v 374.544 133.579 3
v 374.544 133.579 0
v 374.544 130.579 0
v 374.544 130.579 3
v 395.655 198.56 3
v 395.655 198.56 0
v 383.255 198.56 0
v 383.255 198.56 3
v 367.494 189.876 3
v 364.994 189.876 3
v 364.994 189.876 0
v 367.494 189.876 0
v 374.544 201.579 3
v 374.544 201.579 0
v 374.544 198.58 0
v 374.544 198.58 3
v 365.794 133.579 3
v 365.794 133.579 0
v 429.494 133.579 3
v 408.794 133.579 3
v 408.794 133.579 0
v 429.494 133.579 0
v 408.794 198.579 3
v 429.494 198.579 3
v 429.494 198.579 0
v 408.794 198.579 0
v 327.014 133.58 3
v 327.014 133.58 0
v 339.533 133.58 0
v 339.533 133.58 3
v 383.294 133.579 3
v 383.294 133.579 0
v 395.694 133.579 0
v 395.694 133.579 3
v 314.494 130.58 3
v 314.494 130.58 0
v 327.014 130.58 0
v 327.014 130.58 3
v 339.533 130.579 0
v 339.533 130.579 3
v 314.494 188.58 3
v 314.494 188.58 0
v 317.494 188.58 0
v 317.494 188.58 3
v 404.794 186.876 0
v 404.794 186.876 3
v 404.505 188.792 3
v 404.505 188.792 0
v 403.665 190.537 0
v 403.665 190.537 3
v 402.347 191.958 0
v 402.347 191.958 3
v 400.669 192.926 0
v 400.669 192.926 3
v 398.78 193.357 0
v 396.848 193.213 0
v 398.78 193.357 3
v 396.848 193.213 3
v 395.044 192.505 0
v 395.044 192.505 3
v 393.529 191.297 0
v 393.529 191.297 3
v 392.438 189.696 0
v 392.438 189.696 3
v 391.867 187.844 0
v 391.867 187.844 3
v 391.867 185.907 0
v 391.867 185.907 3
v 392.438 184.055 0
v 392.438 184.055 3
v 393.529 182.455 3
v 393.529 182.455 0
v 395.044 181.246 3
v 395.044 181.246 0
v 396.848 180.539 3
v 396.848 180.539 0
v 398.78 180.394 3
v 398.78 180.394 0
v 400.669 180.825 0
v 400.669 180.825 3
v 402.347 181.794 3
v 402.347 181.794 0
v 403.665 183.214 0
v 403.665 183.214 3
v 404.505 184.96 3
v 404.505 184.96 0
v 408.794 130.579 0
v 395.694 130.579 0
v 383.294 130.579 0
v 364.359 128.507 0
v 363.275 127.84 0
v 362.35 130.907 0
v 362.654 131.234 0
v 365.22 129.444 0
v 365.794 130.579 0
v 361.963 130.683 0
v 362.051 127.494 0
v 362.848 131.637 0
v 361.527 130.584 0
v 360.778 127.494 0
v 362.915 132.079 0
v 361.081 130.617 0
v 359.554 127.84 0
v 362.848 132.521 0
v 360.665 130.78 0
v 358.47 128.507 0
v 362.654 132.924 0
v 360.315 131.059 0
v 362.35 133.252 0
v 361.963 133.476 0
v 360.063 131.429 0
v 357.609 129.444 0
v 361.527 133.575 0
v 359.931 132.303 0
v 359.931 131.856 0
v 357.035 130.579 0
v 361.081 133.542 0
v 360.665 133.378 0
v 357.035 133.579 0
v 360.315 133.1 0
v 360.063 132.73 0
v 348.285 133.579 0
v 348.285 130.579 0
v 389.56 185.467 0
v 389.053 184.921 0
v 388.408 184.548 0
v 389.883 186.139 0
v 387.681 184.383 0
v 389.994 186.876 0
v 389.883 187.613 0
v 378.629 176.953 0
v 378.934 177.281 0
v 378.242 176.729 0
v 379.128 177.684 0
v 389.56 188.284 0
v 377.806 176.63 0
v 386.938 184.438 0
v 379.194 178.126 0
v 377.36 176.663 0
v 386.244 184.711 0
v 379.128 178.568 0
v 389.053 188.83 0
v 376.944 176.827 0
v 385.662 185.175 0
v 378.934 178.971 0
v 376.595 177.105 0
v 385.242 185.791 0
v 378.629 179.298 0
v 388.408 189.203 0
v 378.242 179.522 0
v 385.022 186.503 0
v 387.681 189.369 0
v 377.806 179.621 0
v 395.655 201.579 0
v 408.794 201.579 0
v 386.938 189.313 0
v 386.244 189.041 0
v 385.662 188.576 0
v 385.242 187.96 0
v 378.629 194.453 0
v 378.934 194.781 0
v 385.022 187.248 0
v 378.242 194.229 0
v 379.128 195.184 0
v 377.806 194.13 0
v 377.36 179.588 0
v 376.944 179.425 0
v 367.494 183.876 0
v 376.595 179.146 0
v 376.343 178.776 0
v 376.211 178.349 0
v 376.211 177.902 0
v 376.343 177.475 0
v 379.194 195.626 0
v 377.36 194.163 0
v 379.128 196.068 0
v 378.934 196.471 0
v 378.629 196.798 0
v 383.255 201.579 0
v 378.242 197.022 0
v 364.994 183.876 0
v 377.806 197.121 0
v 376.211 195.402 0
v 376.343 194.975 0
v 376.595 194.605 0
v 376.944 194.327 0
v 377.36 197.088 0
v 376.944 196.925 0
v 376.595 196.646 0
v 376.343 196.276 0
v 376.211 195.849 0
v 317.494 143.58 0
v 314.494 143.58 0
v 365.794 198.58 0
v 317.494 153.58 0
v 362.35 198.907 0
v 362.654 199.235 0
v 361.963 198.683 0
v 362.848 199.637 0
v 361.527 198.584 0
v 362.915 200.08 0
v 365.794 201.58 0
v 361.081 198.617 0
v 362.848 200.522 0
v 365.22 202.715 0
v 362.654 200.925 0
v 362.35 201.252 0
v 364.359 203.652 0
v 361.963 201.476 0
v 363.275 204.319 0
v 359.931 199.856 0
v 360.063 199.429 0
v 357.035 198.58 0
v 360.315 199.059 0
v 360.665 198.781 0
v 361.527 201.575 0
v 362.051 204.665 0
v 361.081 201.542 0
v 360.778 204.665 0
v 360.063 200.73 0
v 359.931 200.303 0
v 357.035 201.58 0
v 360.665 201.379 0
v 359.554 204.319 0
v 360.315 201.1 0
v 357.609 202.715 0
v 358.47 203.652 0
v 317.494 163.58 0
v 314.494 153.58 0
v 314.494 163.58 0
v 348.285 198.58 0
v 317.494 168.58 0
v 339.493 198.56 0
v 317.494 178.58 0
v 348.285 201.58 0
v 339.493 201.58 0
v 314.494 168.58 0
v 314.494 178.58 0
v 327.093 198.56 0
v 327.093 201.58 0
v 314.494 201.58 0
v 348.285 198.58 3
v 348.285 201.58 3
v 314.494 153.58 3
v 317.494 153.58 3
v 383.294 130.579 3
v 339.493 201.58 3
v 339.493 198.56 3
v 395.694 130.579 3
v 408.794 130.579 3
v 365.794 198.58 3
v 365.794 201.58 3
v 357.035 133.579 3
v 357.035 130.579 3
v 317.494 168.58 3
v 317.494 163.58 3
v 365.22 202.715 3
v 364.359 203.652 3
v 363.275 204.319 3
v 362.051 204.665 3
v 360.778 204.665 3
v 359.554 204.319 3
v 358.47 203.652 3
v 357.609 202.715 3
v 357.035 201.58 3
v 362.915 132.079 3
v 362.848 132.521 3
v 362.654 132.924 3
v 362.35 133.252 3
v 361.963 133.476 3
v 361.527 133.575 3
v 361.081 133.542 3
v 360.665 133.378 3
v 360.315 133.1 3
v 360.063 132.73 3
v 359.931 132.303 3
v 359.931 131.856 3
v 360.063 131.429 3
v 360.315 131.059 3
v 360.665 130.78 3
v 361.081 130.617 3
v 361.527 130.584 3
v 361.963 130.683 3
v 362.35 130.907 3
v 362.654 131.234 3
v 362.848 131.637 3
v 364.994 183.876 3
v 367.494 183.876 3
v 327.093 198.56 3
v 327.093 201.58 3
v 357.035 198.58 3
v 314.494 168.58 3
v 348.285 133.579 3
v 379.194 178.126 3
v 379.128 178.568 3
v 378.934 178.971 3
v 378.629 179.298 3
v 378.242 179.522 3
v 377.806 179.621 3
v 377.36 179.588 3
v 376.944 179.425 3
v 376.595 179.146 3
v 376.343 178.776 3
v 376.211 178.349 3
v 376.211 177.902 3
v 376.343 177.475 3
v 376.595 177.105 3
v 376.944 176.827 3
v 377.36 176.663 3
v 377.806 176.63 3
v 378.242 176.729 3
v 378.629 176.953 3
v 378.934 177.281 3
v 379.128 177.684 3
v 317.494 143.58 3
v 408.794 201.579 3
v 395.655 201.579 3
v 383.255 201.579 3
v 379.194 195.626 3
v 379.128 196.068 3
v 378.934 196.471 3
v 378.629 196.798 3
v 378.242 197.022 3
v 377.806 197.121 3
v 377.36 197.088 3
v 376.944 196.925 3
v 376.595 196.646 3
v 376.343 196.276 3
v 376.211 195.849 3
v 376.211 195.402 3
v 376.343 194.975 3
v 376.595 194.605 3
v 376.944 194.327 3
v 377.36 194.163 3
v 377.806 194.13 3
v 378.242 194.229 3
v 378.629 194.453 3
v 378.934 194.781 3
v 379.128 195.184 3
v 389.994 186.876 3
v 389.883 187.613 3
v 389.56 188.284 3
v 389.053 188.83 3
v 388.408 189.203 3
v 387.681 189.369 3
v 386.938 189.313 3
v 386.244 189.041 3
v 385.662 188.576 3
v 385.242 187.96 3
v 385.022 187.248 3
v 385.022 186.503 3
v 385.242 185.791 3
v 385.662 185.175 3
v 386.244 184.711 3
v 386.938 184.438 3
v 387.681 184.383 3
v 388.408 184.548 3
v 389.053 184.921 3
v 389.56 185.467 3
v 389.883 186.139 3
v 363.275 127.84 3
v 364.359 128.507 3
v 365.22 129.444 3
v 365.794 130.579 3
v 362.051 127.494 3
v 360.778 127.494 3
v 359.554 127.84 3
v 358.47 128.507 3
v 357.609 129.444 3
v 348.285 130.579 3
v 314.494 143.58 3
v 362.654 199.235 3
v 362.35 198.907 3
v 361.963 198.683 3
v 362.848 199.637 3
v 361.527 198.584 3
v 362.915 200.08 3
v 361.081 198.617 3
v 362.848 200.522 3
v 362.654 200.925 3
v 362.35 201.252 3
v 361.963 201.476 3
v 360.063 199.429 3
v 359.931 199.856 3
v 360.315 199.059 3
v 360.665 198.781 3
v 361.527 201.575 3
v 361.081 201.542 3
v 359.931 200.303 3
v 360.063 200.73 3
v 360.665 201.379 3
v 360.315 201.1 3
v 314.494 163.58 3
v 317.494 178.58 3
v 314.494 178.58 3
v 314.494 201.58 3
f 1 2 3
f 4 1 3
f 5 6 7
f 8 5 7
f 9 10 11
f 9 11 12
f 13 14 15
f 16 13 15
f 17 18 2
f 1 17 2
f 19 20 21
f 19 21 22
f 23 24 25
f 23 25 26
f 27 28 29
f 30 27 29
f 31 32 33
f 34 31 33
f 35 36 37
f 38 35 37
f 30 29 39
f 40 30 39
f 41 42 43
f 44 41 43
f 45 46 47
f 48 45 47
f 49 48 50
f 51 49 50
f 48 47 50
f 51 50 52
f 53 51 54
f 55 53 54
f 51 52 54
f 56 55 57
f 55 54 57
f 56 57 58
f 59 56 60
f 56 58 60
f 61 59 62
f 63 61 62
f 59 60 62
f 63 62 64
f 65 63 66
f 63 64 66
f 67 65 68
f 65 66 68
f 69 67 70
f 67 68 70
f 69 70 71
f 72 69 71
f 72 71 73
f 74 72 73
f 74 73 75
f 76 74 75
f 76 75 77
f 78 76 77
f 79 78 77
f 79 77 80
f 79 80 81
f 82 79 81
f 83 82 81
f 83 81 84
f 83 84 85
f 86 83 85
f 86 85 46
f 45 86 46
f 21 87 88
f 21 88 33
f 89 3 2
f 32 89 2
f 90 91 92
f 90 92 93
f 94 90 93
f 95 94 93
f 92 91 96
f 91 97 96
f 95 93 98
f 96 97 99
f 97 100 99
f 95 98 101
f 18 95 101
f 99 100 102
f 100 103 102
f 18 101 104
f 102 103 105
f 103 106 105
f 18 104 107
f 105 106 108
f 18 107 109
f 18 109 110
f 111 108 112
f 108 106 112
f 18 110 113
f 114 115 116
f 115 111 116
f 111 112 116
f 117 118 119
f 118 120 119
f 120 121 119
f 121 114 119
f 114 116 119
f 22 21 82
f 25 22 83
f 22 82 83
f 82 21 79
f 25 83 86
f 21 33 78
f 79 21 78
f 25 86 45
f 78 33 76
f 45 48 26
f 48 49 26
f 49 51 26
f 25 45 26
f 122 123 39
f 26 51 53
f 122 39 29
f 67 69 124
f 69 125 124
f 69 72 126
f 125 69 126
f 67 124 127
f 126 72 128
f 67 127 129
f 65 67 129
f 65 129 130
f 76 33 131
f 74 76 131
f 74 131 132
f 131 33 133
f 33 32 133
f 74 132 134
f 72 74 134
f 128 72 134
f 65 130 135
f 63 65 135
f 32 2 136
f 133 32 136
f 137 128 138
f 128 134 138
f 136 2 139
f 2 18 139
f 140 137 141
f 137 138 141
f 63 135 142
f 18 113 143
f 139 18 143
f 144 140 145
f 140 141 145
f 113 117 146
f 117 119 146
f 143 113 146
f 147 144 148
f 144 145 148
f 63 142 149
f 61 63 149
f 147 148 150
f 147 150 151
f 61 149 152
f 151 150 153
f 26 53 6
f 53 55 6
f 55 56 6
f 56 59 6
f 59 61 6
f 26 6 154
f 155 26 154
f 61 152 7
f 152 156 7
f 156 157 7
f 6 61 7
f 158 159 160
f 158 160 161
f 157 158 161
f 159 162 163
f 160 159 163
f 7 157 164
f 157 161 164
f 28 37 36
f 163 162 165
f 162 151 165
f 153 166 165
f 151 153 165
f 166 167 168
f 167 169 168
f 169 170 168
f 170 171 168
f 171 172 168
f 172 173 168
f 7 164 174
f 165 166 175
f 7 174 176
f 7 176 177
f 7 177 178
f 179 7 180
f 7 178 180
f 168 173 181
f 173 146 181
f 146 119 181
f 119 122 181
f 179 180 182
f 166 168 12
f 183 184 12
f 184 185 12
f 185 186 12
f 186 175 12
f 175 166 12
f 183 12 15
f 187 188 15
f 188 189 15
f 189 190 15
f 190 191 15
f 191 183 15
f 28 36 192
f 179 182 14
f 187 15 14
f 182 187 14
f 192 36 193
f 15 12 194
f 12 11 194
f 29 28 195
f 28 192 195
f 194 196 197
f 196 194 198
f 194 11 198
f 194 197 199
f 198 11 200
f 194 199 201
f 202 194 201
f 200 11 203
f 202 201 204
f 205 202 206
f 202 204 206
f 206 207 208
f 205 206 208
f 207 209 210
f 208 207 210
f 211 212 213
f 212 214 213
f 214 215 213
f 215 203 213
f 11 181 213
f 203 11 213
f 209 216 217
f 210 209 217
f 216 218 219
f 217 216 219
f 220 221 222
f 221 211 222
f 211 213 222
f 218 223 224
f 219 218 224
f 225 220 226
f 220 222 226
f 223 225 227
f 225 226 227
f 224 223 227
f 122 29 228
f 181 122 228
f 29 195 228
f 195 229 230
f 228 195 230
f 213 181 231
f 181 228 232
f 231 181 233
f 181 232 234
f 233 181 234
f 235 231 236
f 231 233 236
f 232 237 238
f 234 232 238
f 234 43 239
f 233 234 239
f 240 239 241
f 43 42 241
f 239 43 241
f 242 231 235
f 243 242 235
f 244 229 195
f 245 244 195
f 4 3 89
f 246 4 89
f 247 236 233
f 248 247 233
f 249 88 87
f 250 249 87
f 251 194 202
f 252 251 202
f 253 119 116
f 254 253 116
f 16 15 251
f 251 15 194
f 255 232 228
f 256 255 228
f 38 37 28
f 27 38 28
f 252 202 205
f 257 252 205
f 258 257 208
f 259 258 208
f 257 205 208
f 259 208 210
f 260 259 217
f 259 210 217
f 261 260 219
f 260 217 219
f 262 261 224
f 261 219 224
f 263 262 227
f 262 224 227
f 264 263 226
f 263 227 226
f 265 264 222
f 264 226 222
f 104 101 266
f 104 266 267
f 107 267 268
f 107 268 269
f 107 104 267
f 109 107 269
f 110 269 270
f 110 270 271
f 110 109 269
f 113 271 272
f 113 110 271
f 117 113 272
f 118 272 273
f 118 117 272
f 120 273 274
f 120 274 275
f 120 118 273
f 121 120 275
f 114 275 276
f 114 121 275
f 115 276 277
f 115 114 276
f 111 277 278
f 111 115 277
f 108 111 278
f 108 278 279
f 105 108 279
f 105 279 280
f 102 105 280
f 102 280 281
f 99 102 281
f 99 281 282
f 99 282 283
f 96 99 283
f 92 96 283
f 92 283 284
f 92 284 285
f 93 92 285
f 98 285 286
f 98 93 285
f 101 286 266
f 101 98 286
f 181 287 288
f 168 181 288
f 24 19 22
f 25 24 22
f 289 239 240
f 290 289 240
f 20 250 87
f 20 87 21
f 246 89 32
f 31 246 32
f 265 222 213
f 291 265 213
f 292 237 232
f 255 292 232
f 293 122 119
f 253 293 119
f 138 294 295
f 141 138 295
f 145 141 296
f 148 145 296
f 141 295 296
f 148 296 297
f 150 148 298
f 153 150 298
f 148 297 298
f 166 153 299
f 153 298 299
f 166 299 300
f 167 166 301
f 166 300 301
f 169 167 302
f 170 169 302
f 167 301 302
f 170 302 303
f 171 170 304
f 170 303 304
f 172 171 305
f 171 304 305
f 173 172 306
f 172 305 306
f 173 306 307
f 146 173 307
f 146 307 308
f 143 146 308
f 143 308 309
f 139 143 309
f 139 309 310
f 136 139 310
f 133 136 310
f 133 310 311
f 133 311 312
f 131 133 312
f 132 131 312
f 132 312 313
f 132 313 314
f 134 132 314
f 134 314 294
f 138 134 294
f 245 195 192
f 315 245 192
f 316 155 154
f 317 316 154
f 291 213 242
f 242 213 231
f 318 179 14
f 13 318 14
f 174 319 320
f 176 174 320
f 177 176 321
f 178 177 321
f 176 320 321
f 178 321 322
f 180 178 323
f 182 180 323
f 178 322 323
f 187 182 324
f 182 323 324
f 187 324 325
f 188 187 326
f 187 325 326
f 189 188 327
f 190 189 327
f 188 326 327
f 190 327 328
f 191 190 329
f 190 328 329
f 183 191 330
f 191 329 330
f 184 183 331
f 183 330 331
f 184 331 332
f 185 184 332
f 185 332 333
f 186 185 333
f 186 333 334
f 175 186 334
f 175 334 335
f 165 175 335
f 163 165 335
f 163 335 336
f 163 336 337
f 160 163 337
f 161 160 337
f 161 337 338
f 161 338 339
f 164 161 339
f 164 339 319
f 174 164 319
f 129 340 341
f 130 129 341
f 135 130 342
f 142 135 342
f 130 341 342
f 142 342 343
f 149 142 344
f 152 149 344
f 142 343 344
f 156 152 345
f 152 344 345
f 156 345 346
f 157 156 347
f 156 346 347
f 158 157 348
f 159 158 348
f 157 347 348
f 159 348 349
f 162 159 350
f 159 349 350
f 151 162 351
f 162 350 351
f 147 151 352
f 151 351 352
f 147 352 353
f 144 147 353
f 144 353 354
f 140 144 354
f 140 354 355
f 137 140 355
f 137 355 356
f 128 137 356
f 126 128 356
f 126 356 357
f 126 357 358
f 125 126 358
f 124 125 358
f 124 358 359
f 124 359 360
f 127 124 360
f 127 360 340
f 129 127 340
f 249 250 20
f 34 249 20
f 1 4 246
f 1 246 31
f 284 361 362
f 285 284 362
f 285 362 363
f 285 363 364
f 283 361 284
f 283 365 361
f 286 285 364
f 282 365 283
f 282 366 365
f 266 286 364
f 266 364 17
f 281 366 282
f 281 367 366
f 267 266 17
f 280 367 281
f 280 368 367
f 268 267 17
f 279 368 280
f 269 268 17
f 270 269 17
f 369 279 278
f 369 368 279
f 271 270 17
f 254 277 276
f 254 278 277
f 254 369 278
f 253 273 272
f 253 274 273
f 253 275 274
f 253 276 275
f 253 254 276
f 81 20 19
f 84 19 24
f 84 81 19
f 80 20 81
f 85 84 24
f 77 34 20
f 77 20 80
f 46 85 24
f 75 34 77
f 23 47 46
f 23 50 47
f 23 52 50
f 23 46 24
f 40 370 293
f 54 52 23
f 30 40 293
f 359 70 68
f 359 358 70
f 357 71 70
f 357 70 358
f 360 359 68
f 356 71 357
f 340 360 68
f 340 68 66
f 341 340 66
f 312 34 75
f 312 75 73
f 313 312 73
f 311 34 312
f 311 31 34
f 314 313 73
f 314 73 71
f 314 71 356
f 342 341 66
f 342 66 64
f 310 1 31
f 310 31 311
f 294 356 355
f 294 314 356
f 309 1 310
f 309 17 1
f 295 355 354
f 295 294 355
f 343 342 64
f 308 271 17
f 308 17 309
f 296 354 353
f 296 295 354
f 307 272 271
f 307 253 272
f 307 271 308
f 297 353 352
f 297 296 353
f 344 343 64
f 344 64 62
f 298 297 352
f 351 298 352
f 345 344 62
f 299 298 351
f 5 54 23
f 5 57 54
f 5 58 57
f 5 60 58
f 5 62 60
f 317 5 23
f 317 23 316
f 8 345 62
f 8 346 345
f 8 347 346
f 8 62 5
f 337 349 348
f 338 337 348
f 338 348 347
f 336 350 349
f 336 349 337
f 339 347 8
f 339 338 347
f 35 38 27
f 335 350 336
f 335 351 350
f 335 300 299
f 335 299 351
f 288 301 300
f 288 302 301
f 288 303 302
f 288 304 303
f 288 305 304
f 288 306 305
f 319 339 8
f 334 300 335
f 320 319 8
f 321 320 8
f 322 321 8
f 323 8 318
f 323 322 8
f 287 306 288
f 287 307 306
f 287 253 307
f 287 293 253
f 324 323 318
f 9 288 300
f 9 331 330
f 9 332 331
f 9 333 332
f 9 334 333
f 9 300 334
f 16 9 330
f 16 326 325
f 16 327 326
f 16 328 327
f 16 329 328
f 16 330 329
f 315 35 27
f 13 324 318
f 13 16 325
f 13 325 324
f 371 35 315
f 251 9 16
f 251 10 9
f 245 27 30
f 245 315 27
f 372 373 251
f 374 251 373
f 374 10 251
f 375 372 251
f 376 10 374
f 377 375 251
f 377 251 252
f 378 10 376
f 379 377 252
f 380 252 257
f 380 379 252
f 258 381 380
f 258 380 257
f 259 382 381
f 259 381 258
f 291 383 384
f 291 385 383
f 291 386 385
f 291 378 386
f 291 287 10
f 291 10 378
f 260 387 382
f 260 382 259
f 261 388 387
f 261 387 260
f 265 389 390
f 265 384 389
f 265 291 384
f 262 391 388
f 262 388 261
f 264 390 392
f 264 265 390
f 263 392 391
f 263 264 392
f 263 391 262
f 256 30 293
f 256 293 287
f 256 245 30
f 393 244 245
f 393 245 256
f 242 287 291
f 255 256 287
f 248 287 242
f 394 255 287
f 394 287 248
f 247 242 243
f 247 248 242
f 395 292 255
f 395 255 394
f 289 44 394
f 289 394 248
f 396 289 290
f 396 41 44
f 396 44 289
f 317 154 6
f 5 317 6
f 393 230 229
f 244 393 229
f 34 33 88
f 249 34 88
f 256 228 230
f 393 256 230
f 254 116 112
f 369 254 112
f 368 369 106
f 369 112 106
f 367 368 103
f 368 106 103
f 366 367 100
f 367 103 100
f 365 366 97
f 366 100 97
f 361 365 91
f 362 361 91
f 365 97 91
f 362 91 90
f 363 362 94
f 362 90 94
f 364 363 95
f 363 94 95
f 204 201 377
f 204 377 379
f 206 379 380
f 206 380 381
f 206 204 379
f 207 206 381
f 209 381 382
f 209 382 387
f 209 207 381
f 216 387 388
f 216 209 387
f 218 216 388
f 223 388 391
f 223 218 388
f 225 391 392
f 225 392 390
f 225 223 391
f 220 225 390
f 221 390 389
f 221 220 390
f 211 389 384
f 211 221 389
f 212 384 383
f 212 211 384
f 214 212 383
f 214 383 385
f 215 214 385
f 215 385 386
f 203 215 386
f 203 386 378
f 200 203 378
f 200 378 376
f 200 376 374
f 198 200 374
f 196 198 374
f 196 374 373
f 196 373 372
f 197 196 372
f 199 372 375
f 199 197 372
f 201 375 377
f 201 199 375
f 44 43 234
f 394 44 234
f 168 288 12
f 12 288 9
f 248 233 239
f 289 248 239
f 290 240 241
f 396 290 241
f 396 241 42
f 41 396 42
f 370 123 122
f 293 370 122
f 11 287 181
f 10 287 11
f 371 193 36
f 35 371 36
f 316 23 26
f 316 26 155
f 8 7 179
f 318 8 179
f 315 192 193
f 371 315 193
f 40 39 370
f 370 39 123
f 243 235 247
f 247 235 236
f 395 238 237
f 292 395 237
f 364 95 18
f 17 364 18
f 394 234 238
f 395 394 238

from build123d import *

# Parameters (mm, degrees)
CROQUIS1_R              = 1.500000001
SALIENTE_EXTRUIR1_DEPTH = 3
CROQUIS4_W              = 3
CROQUIS4_H              = 71.0001277
SALIENTE_EXTRUIR2_DEPTH = 15
CROQUIS5_R              = 6.5
CROQUIS5_R_2            = 1.5
CROQUIS5_R_3            = 2.5
CROQUIS5_W              = 2.499996062
CROQUIS5_H              = 6.000001641
CORTAR_EXTRUIR1_DEPTH   = 10
CORTAR_EXTRUIR3_START   = -3
CORTAR_EXTRUIR3_DEPTH   = 3


# Read off the part's stored shape, not the designer's step: Cortar-Extruir3
with BuildPart() as part:
    # Croquis1 → Saliente-Extruir1 (new body)
    with BuildSketch(Plane.XY):
        with BuildLine():
            Line((314.494178041, 188.579504075), (317.494178043, 188.579506619))
            Line((317.494178043, 188.579506619), (317.494186524, 178.579506615))
            Line((317.494186524, 178.579506615), (314.494177731, 178.579504071))
            Line((314.494177731, 178.579504071), (314.494186212, 168.579504067))
            Line((314.494186212, 168.579504067), (317.494186214, 168.579506611))
            Line((317.494186214, 168.579506611), (317.494190454, 163.579648323))
            Line((317.494190454, 163.579648323), (314.494168474, 163.579645778))
            Line((314.494168474, 163.579645778), (314.494176956, 153.579645774))
            Line((314.494176956, 153.579645774), (317.494159374, 153.579648318))
            Line((317.494159374, 153.579648318), (317.494167855, 143.579648314))
            Line((317.494167855, 143.579648314), (314.494167854, 143.57964577))
            Line((314.494167854, 143.57964577), (314.494173605, 130.579645765))
            Line((314.494173605, 130.579645765), (327.013519861, 130.579618443))
            Line((327.013519861, 130.579618443), (327.013522591, 133.579618444))
            Line((327.013522591, 133.579618444), (339.532765197, 133.579591123))
            Line((339.532765197, 133.579591123), (339.532765197, 130.57943755))
            Line((339.532765197, 130.57943755), (348.284914925, 130.579428178))
            Line((348.284914925, 130.579428178), (348.284918137, 133.579395242))
            Line((348.284918137, 133.579395242), (357.034918141, 133.579385871))
            Line((357.034918141, 133.579385871), (357.034914928, 130.57938587))
            ThreePointArc((357.034914928, 130.57938587), (361.414562849, 127.449962294), (365.794217472, 130.57937649))
            Line((365.794217472, 130.57937649), (365.794220685, 133.579299126))
            Line((365.794220685, 133.579299126), (374.544220688, 133.579289756))
            Line((374.544220688, 133.579289756), (374.544217476, 130.579290106))
            Line((374.544217476, 130.579290106), (383.294100119, 130.579288157))
            Line((383.294100119, 130.579288157), (383.294100787, 133.579288158))
            Line((383.294100787, 133.579288158), (395.694123645, 133.579285396))
            Line((395.694123645, 133.579285396), (395.694122977, 130.579285394))
            Line((395.694122977, 130.579285394), (414.49422245, 130.579281206))
            Line((414.49422245, 130.579281206), (414.494175849, 201.579408906))
            Line((414.494175849, 201.579408906), (395.654796079, 201.579436111))
            Line((395.654796079, 201.579436111), (395.654796079, 198.559911251))
            Line((395.654796079, 198.559911251), (383.254781657, 198.559889448))
            Line((383.254781657, 198.559889448), (383.254781657, 201.579454018))
            Line((383.254781657, 201.579454018), (374.544176149, 201.579466597))
            Line((374.544176149, 201.579466597), (374.544170874, 198.579568646))
            Line((374.544170874, 198.579568646), (365.794170871, 198.579584031))
            Line((365.794170871, 198.579584031), (365.794176145, 201.579506668))
            ThreePointArc((365.794176145, 201.579506668), (361.414530376, 204.708933254), (357.034873601, 201.579522069))
            Line((357.034873601, 201.579522069), (357.034868326, 198.579522068))
            Line((357.034868326, 198.579522068), (348.284868323, 198.579537453))
            Line((348.284868323, 198.579537453), (348.284873598, 201.579504517))
            Line((348.284873598, 201.579504517), (339.493492813, 201.579517212))
            Line((339.493492813, 201.579517212), (339.493492813, 198.559812504))
            Line((339.493492813, 198.559812504), (327.093469951, 198.559790701))
            Line((327.093469951, 198.559790701), (327.093469951, 201.579535118))
            Line((327.093469951, 201.579535118), (314.494181082, 201.579553313))
            Line((314.494181082, 201.579553313), (314.494178041, 188.579504075))
        make_face()
        with Locations((361.414522236, 200.079542161)):
            Circle(CROQUIS1_R, mode=Mode.SUBTRACT)
        with Locations((361.414567806, 132.079353387)):
            Circle(CROQUIS1_R, mode=Mode.SUBTRACT)
    extrude(amount=SALIENTE_EXTRUIR1_DEPTH)

    # Croquis4 → Saliente-Extruir2 (add)
    with BuildSketch(Plane(origin=(414.494308155, 0.000272052, 0), x_dir=(0, 0, -1), z_dir=(0.9999999999997846, 6.563478556519826e-07, 0))):
        with Locations((-1.5, 166.079073004)):
            Rectangle(CROQUIS4_W, CROQUIS4_H)
    extrude(amount=SALIENTE_EXTRUIR2_DEPTH)

    # Croquis5 → Cortar-Extruir1 (cut)
    with BuildSketch(Plane.XY.offset(3)):
        with Locations((398.2941855, 186.875664671)):
            Circle(CROQUIS5_R)
        with Locations((377.694191243, 178.12565115)):
            Circle(CROQUIS5_R_2)
        with Locations((377.694179757, 195.62565115)):
            Circle(CROQUIS5_R_2)
        with Locations((387.4941855, 186.875657583)):
            Circle(CROQUIS5_R_3)
        with Locations((366.2441855, 186.875643636)):
            Rectangle(CROQUIS5_W, CROQUIS5_H)
    extrude(amount=-CORTAR_EXTRUIR1_DEPTH, mode=Mode.SUBTRACT)

    # Cortar-Extruir3 outline → Cortar-Extruir3 (cut)
    with BuildSketch(Plane(origin=(0, 0, 0), x_dir=(-1, 0, 0), z_dir=(0, 0, -1)).offset(CORTAR_EXTRUIR3_START)):
        Polygon((-429.494177993, 198.579387245), (-408.794180476, 198.579417137), (-408.794180476, 201.579419823), (-414.494175849, 201.579408906), (-429.494175849, 201.579418751), align=None)
        Polygon((-408.794229793, 133.579285396), (-429.49422245, 133.579285396), (-429.49422245, 130.579291051), (-414.49422245, 130.579281206), (-408.794229793, 130.579282476), align=None)
    extrude(amount=CORTAR_EXTRUIR3_DEPTH, mode=Mode.SUBTRACT)


solid = part.part
